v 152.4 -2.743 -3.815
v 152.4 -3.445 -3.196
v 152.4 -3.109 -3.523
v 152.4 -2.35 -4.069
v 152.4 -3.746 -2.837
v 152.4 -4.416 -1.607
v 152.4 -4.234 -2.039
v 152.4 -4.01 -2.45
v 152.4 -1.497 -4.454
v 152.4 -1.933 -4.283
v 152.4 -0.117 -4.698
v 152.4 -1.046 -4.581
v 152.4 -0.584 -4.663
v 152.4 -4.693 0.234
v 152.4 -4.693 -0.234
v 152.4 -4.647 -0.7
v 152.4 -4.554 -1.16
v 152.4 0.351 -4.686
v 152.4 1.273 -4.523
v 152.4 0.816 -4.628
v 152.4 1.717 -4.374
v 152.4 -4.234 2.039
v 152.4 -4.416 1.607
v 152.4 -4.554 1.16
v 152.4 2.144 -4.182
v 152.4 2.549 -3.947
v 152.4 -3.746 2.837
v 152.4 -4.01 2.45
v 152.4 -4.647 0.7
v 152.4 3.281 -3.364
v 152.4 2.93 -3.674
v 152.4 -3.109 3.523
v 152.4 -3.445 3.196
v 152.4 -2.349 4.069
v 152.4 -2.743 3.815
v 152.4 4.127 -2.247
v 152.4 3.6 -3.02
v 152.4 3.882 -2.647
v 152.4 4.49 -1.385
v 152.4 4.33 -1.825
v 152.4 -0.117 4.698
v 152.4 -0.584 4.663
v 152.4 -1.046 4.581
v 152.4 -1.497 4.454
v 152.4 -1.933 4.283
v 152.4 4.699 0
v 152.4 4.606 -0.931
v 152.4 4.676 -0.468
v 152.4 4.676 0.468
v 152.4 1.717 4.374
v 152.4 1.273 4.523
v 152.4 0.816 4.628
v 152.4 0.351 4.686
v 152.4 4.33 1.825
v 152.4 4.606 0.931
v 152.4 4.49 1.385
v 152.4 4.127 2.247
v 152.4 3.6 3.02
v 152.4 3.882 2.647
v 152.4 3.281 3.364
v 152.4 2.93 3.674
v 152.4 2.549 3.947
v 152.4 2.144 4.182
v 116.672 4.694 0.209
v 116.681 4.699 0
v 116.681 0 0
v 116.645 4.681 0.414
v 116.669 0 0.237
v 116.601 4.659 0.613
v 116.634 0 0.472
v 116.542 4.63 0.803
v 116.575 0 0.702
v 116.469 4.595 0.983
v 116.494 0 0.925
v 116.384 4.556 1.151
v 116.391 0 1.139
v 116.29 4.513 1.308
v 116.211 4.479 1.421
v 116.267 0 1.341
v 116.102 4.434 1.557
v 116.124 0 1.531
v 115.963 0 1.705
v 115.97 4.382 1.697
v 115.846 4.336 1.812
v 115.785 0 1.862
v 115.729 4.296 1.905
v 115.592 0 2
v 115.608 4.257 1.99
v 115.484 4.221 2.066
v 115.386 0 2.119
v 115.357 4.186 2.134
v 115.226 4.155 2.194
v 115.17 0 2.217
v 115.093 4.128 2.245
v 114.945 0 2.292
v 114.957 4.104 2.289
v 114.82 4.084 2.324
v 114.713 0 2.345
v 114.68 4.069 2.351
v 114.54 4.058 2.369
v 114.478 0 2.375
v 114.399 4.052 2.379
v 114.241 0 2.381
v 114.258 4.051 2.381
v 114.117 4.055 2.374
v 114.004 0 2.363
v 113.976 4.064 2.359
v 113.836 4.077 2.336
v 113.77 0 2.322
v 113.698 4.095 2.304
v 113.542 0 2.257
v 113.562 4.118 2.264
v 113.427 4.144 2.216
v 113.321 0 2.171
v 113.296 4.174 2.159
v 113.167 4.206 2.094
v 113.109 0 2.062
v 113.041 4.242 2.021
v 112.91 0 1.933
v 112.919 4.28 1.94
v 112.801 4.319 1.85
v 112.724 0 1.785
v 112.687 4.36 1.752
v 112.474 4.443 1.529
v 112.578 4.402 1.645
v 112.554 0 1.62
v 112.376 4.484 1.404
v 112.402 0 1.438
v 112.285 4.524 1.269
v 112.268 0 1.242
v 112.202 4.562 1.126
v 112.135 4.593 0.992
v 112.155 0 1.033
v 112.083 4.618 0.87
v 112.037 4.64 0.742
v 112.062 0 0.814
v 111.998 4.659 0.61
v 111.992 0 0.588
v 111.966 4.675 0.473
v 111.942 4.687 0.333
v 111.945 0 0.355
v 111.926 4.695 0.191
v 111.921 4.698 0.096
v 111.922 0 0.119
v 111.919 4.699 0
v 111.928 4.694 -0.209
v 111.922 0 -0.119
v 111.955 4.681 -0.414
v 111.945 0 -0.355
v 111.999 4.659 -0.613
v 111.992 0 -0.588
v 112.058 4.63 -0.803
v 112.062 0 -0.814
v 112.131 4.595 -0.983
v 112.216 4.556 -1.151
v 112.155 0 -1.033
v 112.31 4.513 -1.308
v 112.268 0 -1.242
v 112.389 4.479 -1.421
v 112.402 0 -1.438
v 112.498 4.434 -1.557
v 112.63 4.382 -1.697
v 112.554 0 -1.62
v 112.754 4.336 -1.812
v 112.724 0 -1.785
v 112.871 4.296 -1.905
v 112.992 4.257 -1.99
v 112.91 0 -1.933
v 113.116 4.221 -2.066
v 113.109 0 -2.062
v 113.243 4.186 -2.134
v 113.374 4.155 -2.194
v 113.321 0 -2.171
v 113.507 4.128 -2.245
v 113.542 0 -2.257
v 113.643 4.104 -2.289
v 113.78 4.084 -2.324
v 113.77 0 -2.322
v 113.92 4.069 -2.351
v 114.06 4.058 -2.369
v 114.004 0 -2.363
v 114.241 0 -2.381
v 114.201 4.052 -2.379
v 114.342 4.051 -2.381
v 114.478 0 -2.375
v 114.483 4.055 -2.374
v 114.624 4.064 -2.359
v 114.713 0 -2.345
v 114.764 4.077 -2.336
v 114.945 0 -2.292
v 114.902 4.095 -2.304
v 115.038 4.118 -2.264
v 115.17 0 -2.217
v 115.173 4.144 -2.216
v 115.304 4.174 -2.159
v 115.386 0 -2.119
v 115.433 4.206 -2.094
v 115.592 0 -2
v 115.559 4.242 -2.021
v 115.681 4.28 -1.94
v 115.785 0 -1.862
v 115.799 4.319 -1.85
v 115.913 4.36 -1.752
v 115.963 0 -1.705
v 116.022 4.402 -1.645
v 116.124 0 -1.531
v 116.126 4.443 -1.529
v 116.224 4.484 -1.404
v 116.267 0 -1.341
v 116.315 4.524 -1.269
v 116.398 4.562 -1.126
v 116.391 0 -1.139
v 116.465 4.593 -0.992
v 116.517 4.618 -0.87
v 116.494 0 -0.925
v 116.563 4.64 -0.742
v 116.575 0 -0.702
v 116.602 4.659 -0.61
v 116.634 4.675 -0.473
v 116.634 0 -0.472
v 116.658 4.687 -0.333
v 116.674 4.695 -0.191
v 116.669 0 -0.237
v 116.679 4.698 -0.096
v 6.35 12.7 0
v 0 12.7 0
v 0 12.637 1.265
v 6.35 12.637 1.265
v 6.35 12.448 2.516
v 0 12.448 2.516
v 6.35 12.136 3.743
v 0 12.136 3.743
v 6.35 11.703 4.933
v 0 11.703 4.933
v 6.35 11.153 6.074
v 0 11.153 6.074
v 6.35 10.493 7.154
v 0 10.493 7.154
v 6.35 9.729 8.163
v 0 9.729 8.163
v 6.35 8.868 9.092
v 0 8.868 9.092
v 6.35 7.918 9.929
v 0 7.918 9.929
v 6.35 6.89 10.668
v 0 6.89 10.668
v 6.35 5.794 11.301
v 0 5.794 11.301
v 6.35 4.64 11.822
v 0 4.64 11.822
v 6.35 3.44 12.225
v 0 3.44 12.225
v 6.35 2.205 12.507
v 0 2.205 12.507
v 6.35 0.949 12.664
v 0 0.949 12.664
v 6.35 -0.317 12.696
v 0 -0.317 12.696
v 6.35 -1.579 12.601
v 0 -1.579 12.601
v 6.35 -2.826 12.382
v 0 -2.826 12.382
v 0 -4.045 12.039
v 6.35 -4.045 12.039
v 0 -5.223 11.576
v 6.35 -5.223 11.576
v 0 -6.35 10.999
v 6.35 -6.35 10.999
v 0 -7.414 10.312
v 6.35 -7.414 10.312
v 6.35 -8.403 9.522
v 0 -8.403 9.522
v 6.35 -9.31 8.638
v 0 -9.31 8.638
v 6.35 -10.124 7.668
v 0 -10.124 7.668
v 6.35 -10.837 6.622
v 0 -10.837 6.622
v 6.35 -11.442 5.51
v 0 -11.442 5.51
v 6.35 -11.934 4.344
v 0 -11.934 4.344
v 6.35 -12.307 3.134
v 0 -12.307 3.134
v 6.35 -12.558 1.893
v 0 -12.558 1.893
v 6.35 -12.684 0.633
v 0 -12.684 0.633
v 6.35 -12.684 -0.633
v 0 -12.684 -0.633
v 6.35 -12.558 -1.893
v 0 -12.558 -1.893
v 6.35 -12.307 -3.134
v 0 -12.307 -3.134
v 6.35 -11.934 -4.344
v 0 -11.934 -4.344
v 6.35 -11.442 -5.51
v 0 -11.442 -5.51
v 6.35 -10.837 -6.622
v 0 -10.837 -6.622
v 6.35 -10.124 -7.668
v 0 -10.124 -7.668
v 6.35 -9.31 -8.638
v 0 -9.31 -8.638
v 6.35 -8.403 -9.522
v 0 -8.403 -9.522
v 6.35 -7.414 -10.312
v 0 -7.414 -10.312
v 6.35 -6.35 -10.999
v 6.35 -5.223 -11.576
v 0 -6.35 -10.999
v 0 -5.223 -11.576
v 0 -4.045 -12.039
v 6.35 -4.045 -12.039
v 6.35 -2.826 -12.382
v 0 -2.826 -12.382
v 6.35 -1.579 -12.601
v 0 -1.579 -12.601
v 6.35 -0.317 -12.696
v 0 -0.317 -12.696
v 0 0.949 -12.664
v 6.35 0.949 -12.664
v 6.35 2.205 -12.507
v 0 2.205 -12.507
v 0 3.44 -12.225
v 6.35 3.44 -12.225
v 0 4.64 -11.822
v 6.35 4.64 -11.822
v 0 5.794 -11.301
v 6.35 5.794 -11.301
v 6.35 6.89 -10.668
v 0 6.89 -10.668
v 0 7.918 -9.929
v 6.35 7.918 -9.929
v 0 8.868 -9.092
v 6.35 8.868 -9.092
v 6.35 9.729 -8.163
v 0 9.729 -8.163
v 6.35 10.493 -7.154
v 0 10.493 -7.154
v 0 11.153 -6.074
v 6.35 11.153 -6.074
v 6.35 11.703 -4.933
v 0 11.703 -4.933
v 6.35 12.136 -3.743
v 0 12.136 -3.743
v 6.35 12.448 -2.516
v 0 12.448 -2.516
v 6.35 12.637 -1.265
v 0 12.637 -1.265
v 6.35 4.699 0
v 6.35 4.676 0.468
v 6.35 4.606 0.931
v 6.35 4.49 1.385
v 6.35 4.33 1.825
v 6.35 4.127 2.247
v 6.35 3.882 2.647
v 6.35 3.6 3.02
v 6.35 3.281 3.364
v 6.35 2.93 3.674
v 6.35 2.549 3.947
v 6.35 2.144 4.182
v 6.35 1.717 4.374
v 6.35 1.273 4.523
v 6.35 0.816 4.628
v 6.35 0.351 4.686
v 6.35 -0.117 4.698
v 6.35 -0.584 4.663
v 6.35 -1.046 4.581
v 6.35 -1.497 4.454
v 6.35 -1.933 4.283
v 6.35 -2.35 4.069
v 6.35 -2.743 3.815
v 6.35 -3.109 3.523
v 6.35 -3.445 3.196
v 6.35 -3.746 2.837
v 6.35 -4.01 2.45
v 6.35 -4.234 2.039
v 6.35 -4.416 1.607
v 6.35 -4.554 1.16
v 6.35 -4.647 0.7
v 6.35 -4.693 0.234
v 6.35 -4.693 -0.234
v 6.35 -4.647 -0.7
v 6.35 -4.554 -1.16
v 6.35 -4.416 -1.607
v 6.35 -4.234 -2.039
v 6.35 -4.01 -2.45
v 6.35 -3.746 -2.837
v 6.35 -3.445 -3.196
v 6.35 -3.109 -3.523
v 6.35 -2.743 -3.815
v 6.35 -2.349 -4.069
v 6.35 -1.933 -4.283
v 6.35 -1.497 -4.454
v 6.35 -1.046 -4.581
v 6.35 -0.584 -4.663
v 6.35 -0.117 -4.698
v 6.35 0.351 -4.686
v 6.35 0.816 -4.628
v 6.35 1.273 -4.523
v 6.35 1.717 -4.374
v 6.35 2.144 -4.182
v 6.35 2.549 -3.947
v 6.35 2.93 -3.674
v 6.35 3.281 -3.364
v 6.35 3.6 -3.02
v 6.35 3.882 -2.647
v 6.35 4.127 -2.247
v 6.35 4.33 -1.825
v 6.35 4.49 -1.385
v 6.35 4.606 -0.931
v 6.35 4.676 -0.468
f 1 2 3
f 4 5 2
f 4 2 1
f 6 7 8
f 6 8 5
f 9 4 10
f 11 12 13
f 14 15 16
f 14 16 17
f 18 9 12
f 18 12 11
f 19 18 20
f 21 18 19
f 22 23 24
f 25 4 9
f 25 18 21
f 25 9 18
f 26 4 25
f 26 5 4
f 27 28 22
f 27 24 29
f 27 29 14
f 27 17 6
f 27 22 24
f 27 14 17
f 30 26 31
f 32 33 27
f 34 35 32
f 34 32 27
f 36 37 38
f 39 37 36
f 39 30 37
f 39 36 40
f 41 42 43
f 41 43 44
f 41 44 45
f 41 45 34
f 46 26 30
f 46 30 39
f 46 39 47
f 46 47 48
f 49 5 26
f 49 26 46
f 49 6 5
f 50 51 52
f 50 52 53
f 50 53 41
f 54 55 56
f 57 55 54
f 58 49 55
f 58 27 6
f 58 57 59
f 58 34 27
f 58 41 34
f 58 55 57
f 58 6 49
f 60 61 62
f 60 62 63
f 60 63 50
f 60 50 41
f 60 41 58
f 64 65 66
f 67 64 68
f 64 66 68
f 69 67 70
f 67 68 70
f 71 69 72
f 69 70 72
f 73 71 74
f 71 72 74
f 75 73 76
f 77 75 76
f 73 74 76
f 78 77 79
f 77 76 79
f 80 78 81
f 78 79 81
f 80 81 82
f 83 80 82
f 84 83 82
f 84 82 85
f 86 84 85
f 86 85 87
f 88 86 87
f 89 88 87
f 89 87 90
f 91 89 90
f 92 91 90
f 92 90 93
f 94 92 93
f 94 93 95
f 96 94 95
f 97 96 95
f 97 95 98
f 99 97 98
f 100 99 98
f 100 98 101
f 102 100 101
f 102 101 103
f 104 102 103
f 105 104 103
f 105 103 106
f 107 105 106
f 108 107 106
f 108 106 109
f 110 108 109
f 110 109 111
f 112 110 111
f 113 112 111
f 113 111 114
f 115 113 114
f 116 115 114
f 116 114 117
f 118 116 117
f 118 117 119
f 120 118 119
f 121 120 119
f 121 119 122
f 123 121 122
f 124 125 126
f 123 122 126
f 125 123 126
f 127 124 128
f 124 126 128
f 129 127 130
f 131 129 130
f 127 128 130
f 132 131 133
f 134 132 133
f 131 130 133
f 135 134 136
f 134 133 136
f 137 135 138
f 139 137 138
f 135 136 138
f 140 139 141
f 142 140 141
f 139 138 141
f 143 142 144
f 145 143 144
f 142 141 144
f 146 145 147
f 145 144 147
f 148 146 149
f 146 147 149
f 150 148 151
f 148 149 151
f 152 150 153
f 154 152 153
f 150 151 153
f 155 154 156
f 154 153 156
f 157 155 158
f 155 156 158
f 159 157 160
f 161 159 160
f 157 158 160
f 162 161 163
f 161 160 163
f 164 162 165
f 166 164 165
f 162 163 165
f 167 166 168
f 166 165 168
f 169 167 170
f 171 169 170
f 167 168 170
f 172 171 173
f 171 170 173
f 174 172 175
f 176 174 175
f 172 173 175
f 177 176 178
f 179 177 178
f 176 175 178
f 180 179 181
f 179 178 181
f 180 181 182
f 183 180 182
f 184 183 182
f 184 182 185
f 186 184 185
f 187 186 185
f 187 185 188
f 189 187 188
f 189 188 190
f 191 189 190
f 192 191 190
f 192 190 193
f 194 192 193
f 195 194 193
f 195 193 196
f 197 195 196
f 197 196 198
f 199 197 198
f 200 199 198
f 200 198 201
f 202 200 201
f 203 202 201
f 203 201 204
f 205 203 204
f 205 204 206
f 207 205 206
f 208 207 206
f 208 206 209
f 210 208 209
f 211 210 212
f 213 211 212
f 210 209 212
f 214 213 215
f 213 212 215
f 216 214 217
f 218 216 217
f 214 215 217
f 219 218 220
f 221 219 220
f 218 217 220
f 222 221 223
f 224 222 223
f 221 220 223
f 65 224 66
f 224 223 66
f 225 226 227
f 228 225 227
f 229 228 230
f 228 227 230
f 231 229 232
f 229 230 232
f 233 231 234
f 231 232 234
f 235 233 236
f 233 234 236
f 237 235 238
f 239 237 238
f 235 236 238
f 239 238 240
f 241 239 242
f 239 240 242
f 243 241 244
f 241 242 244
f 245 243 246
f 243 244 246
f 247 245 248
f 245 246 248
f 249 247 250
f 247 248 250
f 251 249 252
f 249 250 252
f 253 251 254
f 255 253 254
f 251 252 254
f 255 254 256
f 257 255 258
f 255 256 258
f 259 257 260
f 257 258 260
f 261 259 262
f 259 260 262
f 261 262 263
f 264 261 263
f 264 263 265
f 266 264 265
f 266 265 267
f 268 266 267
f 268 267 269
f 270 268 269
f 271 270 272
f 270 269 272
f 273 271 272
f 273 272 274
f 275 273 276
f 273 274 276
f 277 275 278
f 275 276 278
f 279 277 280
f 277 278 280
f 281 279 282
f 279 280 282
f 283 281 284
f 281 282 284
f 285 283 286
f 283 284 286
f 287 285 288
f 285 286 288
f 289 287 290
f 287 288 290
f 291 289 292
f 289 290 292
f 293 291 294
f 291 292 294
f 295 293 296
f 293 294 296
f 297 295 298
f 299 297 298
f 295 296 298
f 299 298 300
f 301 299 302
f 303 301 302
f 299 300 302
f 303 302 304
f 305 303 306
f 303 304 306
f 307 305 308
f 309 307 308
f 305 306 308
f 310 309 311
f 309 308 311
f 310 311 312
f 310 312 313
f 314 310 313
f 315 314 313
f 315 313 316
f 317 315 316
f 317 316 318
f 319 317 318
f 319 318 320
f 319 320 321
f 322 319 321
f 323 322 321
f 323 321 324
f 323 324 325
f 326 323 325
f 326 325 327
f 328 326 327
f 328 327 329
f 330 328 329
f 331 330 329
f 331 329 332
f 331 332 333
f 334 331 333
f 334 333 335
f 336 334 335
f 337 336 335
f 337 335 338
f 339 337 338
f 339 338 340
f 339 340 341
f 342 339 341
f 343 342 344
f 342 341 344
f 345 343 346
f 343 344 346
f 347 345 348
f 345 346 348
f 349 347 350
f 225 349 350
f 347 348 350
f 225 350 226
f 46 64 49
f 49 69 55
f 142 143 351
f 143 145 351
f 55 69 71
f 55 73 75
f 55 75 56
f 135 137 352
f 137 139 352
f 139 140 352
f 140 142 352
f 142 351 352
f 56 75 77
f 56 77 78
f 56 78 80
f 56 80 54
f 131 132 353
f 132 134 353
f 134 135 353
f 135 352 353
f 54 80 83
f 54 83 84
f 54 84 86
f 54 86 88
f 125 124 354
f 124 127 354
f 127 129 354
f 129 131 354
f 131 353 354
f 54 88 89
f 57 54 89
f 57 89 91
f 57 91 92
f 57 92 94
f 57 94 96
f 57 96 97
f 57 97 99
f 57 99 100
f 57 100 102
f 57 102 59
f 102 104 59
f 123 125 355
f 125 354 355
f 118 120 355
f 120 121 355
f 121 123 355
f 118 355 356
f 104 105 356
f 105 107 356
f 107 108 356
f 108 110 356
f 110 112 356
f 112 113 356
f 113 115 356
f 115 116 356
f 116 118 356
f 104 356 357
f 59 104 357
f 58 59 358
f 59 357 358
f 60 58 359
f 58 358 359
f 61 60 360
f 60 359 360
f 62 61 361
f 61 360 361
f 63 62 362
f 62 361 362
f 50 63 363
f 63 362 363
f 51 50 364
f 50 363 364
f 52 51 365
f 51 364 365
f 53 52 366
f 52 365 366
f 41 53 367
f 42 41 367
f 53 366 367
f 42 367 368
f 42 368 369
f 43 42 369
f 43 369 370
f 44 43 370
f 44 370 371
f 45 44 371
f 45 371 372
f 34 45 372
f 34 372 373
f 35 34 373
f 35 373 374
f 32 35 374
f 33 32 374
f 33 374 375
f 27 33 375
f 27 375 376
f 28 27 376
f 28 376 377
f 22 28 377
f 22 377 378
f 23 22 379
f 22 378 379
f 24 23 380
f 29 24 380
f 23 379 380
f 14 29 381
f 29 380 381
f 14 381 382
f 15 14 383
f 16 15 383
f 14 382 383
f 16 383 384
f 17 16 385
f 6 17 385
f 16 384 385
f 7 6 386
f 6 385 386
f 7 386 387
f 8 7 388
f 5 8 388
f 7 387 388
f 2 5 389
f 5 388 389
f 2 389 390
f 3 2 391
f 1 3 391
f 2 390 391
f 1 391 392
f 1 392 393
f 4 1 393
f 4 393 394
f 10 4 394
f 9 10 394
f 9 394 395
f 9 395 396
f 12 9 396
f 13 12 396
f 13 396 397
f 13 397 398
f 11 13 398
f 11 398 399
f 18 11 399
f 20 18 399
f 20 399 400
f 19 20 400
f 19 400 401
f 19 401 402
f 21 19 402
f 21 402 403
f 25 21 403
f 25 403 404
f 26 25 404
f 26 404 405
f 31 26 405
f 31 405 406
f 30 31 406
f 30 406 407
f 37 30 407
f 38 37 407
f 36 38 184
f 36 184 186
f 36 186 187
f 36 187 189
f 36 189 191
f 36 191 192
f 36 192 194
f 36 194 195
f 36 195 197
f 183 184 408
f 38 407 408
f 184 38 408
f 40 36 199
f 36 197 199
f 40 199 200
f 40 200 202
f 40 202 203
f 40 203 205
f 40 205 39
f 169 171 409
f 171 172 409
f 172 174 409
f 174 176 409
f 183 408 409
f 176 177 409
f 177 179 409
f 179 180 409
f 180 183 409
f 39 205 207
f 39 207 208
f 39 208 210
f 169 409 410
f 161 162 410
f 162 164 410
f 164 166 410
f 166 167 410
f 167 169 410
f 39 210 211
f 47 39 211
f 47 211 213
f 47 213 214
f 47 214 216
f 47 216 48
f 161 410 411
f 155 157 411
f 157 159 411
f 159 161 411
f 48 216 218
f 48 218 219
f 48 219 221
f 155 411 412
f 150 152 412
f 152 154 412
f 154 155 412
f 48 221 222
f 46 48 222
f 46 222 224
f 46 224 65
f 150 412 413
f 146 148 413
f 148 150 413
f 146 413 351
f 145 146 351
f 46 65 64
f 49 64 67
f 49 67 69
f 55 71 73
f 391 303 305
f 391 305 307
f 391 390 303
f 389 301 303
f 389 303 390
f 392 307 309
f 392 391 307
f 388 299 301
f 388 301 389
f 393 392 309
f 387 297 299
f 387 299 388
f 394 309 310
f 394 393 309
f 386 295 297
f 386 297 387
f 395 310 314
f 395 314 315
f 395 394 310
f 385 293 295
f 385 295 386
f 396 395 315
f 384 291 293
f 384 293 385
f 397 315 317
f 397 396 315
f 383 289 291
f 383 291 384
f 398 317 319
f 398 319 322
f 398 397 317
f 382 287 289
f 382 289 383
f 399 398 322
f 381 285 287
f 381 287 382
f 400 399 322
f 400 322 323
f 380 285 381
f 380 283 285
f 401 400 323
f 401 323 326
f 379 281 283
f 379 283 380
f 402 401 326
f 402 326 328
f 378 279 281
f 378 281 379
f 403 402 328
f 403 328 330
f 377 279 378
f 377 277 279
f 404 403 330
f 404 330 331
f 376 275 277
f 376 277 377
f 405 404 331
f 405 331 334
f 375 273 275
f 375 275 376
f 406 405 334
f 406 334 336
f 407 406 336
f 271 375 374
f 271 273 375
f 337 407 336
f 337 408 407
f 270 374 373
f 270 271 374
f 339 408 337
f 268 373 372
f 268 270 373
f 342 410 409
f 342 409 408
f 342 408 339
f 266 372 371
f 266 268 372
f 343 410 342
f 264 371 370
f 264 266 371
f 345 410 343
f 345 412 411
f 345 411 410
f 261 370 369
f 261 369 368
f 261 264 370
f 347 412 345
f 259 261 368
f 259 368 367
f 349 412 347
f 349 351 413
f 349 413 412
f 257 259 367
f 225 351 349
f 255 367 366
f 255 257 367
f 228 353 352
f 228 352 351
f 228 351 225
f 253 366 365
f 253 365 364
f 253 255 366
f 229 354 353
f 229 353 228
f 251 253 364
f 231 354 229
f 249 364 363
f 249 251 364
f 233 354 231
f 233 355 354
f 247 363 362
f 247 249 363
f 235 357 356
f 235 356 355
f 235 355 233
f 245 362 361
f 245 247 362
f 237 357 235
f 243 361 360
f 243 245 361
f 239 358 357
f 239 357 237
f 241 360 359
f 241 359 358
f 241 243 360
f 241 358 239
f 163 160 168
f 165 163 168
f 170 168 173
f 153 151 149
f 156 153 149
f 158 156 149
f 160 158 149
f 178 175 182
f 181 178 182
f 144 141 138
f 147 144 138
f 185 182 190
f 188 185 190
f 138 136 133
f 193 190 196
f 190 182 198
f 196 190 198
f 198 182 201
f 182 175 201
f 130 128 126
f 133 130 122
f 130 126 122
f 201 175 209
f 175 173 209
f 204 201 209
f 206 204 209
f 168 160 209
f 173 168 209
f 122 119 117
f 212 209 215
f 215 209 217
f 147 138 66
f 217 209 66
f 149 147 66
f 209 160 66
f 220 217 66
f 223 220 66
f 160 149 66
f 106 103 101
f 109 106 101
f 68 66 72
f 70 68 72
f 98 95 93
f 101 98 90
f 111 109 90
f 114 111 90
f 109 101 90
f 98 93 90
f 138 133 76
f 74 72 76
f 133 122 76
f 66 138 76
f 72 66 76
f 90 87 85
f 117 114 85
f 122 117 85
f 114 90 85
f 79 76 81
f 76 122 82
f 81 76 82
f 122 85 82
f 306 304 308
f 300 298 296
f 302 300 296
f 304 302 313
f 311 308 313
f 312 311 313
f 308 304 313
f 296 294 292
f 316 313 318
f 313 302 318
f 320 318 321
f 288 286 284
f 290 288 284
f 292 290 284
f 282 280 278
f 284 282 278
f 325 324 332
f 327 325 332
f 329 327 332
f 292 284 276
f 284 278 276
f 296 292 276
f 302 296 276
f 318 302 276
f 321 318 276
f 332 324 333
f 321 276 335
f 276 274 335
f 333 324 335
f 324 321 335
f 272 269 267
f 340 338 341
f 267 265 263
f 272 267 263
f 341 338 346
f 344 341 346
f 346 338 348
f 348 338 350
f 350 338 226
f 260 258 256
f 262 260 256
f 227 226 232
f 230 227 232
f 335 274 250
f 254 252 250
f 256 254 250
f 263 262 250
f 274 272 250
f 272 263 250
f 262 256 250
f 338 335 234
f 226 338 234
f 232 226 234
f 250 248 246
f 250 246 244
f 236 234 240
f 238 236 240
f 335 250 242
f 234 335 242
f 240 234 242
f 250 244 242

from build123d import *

# Parameters (mm, degrees)
F0_R     = 4.699
F1_DEPTH = 152.4
F2_R     = 12.7
F3_DEPTH = 6.35
F4_R     = 2.38125
F5_DEPTH = 12.701


with BuildPart() as f1:
    # F0 (on Right) → F1 (new body)
    with BuildSketch(Plane.YZ):
        Circle(F0_R)
    extrude(amount=F1_DEPTH)

    # F2 (on Right) → F3 (join)
    with BuildSketch(Plane.YZ):
        Circle(F2_R)
    extrude(amount=F3_DEPTH)

    # F4 (on Front) → F5 (cut, through all)
    with BuildSketch(Plane.XZ):
        with Locations((114.3, 0)):
            Circle(F4_R)
    extrude(amount=-F5_DEPTH, mode=Mode.SUBTRACT)


solid = f1.part
